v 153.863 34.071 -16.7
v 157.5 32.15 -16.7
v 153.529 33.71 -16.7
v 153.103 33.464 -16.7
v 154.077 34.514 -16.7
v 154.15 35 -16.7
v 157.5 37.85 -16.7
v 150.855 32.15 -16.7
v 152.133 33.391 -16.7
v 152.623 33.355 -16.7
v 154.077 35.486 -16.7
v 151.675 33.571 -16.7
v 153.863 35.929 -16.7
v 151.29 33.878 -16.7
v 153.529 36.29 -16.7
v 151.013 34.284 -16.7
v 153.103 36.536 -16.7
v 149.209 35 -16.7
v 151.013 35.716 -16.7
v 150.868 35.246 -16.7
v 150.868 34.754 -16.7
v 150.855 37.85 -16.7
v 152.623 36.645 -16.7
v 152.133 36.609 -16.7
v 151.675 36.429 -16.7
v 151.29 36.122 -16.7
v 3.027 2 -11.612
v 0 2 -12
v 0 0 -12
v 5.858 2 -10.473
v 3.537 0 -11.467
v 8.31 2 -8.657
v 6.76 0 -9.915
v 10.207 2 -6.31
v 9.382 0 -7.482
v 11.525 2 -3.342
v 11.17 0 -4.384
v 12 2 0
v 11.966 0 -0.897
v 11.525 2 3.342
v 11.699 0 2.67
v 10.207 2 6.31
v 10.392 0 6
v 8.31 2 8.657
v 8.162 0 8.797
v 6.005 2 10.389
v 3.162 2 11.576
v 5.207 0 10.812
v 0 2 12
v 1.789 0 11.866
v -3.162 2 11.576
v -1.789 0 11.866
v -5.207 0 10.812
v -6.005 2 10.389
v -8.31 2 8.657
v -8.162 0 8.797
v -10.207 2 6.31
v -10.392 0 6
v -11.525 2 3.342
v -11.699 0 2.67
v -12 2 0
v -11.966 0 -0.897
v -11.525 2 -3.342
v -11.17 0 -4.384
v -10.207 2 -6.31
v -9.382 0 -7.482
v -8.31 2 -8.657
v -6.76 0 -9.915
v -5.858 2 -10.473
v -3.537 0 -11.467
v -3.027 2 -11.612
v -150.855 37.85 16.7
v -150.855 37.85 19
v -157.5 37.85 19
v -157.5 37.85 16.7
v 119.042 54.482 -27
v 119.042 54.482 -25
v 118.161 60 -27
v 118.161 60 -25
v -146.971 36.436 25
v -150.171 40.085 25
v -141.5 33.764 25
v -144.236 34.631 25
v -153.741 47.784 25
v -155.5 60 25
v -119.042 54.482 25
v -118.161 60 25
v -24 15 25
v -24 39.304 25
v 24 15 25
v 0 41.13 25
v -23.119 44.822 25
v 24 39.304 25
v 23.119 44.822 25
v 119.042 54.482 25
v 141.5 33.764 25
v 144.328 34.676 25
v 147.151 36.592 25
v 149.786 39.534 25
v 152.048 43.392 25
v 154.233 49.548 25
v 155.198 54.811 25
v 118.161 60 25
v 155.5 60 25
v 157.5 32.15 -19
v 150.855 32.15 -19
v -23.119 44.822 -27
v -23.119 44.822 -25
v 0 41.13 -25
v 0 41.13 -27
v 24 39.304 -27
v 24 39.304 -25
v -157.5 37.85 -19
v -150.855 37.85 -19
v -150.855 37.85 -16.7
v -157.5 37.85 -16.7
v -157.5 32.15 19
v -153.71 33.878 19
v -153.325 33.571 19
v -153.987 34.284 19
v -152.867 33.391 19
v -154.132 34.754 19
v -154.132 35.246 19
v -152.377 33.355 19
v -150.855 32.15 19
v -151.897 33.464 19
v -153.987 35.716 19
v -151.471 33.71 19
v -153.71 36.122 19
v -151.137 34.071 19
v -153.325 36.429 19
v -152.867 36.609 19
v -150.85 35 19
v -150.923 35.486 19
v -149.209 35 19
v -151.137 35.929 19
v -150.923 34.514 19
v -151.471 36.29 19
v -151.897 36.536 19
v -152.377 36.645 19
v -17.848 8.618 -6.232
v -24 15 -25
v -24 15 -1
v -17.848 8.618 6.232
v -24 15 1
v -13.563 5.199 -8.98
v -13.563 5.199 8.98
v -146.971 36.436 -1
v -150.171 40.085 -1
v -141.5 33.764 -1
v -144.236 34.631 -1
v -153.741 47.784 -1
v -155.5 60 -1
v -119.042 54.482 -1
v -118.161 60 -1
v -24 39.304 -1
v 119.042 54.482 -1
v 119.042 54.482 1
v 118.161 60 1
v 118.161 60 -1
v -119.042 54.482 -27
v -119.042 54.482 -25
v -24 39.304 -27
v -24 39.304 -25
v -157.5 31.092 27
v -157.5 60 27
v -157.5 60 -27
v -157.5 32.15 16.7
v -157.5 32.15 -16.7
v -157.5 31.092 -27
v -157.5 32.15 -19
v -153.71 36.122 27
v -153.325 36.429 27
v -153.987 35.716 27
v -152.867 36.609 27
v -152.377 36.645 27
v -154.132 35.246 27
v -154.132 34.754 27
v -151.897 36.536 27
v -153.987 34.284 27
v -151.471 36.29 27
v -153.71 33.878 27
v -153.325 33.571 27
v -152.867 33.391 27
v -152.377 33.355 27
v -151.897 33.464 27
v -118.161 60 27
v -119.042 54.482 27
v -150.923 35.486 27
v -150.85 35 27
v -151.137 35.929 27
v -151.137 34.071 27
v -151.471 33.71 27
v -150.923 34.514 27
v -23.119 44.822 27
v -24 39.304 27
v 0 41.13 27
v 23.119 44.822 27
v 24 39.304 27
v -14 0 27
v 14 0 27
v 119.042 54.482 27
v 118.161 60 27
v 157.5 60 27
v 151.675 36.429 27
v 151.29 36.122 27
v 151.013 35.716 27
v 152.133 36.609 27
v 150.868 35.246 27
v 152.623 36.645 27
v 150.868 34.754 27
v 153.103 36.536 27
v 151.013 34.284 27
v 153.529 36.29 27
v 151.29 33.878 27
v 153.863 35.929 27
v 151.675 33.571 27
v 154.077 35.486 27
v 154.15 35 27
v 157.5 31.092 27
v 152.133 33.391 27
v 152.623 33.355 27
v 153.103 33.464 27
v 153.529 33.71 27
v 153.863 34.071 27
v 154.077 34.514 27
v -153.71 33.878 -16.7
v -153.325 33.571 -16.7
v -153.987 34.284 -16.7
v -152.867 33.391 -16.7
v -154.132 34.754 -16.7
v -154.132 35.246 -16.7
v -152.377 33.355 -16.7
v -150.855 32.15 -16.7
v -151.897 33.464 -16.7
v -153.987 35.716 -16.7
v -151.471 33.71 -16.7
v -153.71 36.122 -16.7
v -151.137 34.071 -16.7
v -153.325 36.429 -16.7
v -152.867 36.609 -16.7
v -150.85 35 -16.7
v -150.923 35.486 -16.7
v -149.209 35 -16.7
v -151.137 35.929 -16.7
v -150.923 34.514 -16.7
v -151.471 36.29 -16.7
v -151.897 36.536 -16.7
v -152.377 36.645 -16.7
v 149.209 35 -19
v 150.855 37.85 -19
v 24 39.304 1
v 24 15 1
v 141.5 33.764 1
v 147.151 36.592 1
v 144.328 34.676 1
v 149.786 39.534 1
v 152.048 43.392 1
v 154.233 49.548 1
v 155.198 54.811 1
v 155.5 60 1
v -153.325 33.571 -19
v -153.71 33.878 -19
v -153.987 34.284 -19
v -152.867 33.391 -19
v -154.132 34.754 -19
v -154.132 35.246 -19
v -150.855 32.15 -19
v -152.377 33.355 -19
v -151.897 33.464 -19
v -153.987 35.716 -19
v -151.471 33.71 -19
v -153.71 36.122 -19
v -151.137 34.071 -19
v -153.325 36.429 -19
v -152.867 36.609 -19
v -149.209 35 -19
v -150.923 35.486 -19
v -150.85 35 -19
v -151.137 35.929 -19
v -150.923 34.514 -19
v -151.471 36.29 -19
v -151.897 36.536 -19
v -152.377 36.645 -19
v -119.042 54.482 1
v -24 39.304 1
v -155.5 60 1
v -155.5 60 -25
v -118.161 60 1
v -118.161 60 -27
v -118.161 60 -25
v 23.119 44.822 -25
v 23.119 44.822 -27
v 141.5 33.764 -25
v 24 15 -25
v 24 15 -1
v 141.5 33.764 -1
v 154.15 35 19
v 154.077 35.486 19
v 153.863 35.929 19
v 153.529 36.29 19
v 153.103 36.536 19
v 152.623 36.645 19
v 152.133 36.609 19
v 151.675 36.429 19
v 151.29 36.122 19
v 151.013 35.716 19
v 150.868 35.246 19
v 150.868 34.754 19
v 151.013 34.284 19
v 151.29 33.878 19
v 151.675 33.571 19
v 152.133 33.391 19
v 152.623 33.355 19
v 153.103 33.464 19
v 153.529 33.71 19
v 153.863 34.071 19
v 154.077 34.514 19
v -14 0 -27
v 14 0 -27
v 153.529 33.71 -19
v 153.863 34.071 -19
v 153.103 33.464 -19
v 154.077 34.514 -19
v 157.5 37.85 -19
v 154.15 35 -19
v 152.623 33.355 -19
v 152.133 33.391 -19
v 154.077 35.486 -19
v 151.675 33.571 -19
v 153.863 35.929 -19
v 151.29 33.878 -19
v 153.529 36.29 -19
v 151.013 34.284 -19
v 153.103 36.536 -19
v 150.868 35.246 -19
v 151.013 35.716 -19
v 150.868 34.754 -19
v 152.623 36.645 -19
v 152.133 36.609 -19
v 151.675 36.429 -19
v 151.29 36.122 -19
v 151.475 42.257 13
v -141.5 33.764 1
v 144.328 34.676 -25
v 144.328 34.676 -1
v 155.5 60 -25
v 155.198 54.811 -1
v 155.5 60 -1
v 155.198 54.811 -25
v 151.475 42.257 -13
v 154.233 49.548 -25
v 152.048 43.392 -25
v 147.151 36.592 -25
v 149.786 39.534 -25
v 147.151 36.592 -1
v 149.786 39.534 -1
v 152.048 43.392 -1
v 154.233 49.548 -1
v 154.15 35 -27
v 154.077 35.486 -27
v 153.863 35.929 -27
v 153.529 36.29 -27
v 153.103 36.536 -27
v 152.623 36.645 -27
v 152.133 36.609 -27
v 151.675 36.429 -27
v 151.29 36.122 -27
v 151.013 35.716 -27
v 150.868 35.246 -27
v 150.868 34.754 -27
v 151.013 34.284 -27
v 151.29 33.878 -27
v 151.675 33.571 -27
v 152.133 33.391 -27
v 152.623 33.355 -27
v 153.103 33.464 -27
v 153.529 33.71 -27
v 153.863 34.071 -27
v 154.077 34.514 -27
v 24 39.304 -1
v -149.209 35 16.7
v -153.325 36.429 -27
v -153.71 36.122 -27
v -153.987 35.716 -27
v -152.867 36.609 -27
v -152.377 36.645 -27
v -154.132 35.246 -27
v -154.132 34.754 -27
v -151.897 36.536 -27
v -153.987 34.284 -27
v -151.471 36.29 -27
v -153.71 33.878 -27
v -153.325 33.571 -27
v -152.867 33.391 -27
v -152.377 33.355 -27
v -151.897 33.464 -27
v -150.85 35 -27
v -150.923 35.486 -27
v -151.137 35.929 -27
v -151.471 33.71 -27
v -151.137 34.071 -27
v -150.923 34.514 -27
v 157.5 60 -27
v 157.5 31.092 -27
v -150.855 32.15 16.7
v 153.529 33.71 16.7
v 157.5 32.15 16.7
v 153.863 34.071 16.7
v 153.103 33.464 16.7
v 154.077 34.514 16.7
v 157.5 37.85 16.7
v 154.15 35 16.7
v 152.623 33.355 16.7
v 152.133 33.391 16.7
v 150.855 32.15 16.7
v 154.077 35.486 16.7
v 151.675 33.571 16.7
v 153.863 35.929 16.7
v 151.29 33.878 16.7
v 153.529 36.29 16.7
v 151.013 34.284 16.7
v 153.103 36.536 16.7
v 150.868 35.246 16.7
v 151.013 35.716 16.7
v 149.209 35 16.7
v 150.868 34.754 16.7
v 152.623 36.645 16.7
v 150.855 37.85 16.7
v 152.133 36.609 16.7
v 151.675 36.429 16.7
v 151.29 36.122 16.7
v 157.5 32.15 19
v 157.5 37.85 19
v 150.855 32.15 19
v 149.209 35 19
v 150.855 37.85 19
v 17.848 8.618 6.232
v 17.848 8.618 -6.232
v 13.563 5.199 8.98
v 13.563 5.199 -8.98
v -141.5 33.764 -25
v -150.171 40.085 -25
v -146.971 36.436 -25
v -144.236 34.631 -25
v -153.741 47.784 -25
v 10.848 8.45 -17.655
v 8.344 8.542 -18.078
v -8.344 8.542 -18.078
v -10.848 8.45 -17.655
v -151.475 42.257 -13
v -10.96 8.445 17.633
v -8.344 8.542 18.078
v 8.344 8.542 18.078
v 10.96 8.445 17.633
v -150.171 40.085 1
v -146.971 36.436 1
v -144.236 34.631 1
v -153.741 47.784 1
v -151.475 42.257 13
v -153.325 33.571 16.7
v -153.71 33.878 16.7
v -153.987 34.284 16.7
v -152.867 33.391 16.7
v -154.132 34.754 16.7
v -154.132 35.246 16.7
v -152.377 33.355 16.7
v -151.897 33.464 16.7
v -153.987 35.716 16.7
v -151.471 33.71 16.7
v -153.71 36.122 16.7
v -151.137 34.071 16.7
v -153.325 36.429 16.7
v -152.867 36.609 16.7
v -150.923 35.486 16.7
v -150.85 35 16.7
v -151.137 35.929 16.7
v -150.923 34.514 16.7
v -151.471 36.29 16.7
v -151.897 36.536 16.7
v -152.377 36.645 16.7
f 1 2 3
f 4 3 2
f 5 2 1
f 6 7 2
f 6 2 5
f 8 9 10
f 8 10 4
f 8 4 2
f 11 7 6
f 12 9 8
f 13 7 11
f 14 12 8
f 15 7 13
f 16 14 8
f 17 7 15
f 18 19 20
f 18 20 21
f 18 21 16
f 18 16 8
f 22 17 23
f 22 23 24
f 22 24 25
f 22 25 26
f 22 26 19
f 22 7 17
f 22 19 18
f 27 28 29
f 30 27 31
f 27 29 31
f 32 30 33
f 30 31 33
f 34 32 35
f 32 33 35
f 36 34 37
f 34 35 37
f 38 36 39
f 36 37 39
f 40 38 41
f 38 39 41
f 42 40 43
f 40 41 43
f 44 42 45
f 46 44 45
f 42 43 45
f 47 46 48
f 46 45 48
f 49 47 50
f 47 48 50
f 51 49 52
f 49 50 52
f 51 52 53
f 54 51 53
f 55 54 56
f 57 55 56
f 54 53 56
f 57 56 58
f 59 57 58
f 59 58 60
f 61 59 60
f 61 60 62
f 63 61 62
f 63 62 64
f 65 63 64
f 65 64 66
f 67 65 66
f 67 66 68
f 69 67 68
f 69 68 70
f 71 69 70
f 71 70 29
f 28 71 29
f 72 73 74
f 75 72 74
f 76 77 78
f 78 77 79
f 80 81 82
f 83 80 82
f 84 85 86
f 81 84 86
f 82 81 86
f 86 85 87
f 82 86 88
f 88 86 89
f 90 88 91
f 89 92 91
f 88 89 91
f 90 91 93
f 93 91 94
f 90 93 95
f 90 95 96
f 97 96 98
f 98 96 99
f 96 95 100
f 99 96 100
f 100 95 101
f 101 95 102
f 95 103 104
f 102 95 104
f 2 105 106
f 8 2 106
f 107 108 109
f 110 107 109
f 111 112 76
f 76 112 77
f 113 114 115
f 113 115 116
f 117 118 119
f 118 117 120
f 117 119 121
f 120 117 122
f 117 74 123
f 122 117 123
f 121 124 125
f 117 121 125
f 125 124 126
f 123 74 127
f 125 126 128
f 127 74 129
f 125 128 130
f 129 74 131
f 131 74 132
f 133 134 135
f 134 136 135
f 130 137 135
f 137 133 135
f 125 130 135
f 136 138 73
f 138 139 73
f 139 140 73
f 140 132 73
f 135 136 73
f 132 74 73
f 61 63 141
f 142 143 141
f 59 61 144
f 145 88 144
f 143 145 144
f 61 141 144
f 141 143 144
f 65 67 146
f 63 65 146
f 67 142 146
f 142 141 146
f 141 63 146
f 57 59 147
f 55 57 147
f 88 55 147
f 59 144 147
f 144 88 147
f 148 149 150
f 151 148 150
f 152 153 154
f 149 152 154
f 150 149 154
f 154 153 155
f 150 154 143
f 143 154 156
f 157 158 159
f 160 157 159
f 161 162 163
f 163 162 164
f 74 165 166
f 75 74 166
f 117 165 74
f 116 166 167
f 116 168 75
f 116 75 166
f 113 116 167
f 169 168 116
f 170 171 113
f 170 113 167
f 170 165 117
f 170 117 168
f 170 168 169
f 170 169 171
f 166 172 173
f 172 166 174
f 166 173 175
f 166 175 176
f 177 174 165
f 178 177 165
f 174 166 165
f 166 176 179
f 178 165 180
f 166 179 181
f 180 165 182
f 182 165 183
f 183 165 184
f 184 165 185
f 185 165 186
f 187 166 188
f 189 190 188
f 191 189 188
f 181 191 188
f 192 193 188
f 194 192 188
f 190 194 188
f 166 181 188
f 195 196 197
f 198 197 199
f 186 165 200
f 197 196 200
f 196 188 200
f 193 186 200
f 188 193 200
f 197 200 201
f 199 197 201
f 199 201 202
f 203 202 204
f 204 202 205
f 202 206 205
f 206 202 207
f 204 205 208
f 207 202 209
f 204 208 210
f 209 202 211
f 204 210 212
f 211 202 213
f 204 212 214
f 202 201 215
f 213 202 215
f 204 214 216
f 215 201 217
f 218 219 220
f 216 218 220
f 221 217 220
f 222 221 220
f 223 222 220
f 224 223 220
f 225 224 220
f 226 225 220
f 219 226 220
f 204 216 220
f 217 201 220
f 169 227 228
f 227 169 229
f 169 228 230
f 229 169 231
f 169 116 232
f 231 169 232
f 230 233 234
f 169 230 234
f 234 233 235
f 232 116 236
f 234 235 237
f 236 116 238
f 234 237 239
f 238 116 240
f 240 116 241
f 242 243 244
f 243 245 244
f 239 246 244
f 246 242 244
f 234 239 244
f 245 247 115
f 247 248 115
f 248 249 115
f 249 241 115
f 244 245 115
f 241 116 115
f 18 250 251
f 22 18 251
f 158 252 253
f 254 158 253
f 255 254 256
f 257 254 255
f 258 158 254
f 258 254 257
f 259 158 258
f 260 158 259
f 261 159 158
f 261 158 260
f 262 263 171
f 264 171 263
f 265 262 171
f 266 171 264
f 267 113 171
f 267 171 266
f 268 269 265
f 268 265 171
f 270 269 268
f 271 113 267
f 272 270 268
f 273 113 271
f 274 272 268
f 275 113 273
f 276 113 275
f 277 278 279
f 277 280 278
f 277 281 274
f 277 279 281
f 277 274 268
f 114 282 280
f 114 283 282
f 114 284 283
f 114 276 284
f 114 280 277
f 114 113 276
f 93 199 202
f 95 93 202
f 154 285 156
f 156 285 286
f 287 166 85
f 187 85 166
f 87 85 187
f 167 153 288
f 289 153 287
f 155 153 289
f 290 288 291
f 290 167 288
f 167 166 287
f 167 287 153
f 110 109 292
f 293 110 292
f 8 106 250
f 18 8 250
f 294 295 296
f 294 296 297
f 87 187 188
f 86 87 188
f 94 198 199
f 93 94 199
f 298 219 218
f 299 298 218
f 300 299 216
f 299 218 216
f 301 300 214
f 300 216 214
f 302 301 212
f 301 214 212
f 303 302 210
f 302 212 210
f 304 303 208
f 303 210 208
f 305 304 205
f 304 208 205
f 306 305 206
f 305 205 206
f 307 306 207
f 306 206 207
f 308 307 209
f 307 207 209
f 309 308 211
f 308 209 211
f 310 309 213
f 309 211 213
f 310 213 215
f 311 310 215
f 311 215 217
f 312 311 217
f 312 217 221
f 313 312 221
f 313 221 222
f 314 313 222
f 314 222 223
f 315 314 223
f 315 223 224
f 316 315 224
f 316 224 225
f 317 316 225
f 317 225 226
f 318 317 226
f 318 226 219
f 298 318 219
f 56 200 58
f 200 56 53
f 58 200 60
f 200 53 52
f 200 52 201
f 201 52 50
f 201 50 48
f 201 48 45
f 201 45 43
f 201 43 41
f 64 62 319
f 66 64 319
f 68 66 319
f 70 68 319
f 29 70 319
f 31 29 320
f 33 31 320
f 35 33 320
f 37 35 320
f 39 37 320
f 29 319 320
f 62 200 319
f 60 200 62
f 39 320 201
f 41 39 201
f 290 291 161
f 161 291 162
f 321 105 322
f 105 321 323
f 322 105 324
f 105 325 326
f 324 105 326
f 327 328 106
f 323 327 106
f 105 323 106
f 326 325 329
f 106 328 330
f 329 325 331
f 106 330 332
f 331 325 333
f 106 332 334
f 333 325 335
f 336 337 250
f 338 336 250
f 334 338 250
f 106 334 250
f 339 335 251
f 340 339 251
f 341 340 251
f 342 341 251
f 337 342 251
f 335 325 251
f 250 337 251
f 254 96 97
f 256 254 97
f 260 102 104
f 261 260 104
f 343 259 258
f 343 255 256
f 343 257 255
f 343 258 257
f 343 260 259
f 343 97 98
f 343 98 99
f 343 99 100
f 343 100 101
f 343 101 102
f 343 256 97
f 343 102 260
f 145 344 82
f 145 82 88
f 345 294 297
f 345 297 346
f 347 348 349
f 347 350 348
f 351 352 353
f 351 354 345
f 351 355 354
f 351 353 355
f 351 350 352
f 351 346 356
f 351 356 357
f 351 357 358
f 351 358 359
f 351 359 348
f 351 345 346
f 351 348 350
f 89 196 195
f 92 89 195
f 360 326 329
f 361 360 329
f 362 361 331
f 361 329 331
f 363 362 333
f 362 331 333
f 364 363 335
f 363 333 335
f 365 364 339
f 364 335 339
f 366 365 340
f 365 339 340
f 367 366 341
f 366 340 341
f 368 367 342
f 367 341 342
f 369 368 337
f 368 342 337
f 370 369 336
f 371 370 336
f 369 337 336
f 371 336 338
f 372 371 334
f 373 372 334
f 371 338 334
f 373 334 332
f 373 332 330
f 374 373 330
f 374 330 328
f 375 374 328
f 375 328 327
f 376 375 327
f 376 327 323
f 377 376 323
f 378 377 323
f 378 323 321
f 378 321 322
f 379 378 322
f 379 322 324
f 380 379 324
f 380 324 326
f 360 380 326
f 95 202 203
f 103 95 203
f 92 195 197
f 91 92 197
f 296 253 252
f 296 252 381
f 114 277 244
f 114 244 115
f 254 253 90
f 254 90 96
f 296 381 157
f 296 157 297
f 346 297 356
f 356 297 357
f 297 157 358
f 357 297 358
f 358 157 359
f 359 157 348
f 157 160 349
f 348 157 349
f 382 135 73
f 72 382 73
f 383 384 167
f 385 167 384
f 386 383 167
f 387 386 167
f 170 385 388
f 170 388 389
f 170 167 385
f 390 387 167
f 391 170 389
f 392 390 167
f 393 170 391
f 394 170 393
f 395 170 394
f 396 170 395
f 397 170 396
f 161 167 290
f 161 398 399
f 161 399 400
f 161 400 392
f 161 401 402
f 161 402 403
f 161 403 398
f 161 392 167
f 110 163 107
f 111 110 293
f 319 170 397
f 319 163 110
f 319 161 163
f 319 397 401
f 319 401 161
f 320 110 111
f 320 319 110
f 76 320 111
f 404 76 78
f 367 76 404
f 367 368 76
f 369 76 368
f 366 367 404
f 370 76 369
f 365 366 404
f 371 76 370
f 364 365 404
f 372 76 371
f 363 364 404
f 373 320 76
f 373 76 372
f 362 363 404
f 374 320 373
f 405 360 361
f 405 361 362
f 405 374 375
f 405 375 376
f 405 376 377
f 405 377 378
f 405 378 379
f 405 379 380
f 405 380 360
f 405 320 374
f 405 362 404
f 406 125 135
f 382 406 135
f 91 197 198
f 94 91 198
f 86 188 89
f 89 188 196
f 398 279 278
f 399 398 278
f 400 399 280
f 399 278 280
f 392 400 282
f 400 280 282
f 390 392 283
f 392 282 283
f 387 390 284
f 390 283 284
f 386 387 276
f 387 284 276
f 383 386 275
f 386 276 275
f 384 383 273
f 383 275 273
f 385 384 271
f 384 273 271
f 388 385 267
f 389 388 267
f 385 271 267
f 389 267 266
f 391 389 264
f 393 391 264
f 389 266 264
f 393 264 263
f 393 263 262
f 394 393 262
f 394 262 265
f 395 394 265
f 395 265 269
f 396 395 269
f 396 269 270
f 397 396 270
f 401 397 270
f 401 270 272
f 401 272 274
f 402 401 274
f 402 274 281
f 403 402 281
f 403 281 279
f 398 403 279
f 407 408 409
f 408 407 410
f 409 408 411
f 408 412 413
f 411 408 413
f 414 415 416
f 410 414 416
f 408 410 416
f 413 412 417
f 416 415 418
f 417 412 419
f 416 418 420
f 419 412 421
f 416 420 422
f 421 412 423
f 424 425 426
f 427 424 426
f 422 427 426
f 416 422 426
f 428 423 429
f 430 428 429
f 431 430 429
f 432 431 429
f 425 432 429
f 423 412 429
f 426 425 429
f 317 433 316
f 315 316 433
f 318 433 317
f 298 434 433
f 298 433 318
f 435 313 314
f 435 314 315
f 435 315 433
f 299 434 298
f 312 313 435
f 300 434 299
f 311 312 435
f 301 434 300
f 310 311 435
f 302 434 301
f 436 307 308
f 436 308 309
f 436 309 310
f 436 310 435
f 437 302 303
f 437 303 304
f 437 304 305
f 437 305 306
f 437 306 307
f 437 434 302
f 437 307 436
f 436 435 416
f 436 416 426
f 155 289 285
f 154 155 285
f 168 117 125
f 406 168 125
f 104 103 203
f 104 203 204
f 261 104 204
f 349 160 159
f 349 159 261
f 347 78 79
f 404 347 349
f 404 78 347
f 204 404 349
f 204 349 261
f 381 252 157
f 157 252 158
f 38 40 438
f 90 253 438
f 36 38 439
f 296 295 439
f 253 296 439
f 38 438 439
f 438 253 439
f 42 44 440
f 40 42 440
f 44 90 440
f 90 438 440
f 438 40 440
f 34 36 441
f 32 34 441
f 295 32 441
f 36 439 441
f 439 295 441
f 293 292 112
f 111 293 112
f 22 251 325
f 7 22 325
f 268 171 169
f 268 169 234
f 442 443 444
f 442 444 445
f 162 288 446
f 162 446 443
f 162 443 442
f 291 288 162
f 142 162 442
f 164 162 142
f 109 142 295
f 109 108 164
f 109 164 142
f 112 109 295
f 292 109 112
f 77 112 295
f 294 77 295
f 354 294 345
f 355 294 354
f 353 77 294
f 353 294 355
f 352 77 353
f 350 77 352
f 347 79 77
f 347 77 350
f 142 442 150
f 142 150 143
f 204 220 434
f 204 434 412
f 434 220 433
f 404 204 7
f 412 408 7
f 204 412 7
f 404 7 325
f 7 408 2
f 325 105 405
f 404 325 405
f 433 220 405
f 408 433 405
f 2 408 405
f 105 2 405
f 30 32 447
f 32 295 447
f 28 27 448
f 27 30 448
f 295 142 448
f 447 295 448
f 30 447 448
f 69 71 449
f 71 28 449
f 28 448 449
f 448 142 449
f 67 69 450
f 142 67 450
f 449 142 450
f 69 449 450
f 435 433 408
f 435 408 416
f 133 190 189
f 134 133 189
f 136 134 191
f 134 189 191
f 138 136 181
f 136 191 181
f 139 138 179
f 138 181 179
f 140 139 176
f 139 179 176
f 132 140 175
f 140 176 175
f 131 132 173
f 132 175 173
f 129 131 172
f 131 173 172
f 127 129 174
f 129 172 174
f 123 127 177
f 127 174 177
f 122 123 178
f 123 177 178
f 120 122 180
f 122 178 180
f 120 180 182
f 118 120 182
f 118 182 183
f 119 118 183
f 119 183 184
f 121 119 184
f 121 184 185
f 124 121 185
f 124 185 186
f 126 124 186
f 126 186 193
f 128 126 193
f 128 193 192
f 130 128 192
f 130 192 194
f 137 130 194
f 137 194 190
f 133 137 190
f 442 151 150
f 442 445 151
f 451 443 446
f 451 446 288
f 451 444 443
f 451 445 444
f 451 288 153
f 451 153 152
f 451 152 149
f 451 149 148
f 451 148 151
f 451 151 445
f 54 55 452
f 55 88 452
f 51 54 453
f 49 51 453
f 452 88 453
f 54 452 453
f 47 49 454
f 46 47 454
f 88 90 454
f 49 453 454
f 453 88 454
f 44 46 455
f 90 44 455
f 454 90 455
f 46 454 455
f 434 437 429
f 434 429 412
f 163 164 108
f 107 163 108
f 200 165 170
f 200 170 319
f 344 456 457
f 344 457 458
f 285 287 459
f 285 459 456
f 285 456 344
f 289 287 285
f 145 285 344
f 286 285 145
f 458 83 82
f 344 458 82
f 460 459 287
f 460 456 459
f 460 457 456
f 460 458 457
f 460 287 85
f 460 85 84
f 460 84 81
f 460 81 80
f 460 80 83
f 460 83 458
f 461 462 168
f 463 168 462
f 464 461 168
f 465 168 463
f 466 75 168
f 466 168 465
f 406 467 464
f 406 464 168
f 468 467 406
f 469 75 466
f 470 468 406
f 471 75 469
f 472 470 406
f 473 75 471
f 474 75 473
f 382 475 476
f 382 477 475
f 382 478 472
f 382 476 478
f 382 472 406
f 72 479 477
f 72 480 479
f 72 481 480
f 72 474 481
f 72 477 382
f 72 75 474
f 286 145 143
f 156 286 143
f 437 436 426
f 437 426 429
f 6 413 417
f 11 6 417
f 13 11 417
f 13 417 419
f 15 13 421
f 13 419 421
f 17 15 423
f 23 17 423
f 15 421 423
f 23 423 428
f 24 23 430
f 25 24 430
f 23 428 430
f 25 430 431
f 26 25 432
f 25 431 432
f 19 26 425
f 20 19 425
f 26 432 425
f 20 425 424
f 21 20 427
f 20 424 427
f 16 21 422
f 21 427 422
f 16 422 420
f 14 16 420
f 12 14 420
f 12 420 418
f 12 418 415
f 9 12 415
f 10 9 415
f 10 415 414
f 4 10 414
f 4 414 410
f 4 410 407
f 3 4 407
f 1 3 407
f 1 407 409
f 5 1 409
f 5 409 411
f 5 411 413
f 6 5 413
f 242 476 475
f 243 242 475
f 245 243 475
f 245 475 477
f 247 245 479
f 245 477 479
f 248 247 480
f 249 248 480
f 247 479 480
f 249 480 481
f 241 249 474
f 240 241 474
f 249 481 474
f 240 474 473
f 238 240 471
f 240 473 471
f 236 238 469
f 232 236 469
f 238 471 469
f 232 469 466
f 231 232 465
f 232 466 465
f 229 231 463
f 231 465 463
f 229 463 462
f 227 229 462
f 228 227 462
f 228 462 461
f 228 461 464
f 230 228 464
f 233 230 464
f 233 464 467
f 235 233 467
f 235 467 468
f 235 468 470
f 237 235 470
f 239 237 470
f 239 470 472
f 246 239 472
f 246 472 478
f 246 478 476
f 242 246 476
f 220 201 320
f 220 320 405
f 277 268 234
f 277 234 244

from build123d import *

# Parameters (mm, degrees)
SKETCH1_W               = 315
SKETCH1_H               = 54
BOSS_EXTRUDE2_DEPTH     = 60
CUT_EXTRUDE2_DEPTH      = 25
CUT_EXTRUDE2_DEPTH_BACK = 25
BOSS_EXTRUDE3_DEPTH     = 1
SKETCH9_W               = 48
SKETCH9_H               = 50
CUT_EXTRUDE5_DEPTH      = 167.012800738
SKETCH10_R              = 12
CUT_EXTRUDE6_DEPTH      = 2
SKETCH11_R              = 1.65
CUT_EXTRUDE7_DEPTH      = 177.98093121
CUT_EXTRUDE8_DEPTH      = 2.3
CUT_EXTRUDE9_DEPTH      = 2.3


with BuildPart() as part:
    # Sketch1 → Boss-Extrude2 (new body)
    with BuildSketch(Plane(origin=(0, 0, 0), x_dir=(1, 0, 0), z_dir=(0, 1, 0))):
        Rectangle(SKETCH1_W, SKETCH1_H)
    extrude(amount=BOSS_EXTRUDE2_DEPTH)

    # Sketch7 → Cut-Extrude2 (cut, two sides: drawn at the far end of the back side and taken through both)
    with BuildSketch(Plane.XY.offset(-CUT_EXTRUDE2_DEPTH_BACK)):
        with BuildLine():
            Line((-141.5, 33.764258555), (-24, 15))
            Line((-24, 15), (24, 15))
            Line((24, 15), (141.5, 33.764258555))
            add(Edge.make_bspline(
                [(141.5, 33.764258555), (155.5, 36), (155.5, 60)],
                knots=[3.234883811, 3.234883811, 3.234883811, 4.71238898, 4.71238898, 4.71238898], degree=2, weights=[1, 0.739309101, 1]))
            Line((155.5, 60), (-155.5, 60))
            add(Edge.make_bspline(
                [(-155.5, 60), (-155.5, 36), (-141.5, 33.764258555)],
                knots=[4.71238898, 4.71238898, 4.71238898, 6.18989415, 6.18989415, 6.18989415], degree=2, weights=[1, 0.739309101, 1]))
        make_face()
    extrude(amount=CUT_EXTRUDE2_DEPTH + CUT_EXTRUDE2_DEPTH_BACK, mode=Mode.SUBTRACT)

    # Sketch7<2> → Boss-Extrude3 (add, symmetric)
    with BuildSketch(Plane.XY):
        with BuildLine():
            Line((-141.5, 33.764258555), (-24, 15))
            Line((-24, 15), (24, 15))
            Line((24, 15), (141.5, 33.764258555))
            add(Edge.make_bspline(
                [(141.5, 33.764258555), (155.5, 36), (155.5, 60)],
                knots=[3.234883811, 3.234883811, 3.234883811, 4.71238898, 4.71238898, 4.71238898], degree=2, weights=[1, 0.739309101, 1]))
            Line((155.5, 60), (-155.5, 60))
            add(Edge.make_bspline(
                [(-155.5, 60), (-155.5, 36), (-141.5, 33.764258555)],
                knots=[4.71238898, 4.71238898, 4.71238898, 6.18989415, 6.18989415, 6.18989415], degree=2, weights=[1, 0.739309101, 1]))
        make_face()
    extrude(amount=BOSS_EXTRUDE3_DEPTH, both=True)

    # Sketch9 → Cut-Extrude5 (cut, through all)
    with BuildSketch(Plane(origin=(0, 15, 0), x_dir=(1, 0, 0), z_dir=(0, 1, 0))):
        Rectangle(SKETCH9_W, SKETCH9_H)
    extrude(amount=CUT_EXTRUDE5_DEPTH, mode=Mode.SUBTRACT)

    # Sketch10 → Cut-Extrude6 (cut)
    with BuildSketch(Plane.XZ):
        with Locations(Location((0, 0, 0), (0, 0, 270))):
            Circle(SKETCH10_R)
    extrude(amount=-CUT_EXTRUDE6_DEPTH, mode=Mode.SUBTRACT)

    # Sketch4 for Cut-Loft3 → Cut-Loft3 section 0
    with BuildSketch(Plane.XZ.offset(-2)):
        with BuildLine():
            # circular arc as an exact rational Bezier (weights 1, cos(half-angle), 1)
            Bezier((-8.310381938, 8.656647852), (0, 16.634614514), (8.310381938, 8.656647852), weights=[1, 0.721387321, 1])
            Bezier((8.310381938, 8.656647852), (17.327723452, 0), (8.310381938, -8.656647852), weights=[1, 0.692531828, 1])
            Bezier((8.310381938, -8.656647852), (0, -16.634614514), (-8.310381938, -8.656647852), weights=[1, 0.721387321, 1])
            Bezier((-8.310381938, -8.656647852), (-17.327723452, 0), (-8.310381938, 8.656647852), weights=[1, 0.692531828, 1])
        make_face()
    # Sketch9<2> → Cut-Loft3 section 1
    with BuildSketch(Plane(origin=(0, 15, 0), x_dir=(1, 0, 0), z_dir=(0, 1, 0))):
        with BuildLine():
            Line((-24, -25), (24, -25))
            Line((24, -25), (24, 25))
            Line((24, 25), (-24, 25))
            Line((-24, 25), (-24, -25))
        make_face()
    loft(mode=Mode.SUBTRACT)

    # Sketch11 → Cut-Extrude7 (cut, through all)
    with BuildSketch(Plane.XY.offset(27)):
        with Locations((-152.5, 35)):
            Circle(SKETCH11_R)
        with Locations((152.5, 35)):
            Circle(SKETCH11_R)
        Polygon((-157.5, 31.091711648), (-14, 0), (-157.5, 0), align=None)
        Polygon((157.5, 31.091711648), (157.5, 0), (14, 0), align=None)
        Polygon((-118.160810021, 60), (-119.042024296, 54.481920135), (-24, 39.304106369), (-23.118785725, 44.822186234), (0, 41.130212848), (23.118785725, 44.822186234), (24, 39.304106369), (119.042024296, 54.481920135), (118.160810021, 60), align=None)
    extrude(amount=-CUT_EXTRUDE7_DEPTH, mode=Mode.SUBTRACT)

    # Sketch12 → Cut-Extrude8 (cut)
    with BuildSketch(Plane.XY.offset(19)):
        Polygon((-150.854551733, 37.85), (-157.5, 37.85), (-157.5, 32.15), (-150.854551733, 32.15), (-149.209103466, 35), align=None)
        Polygon((157.5, 37.85), (157.5, 32.15), (150.854551733, 32.15), (149.209103466, 35), (150.854551733, 37.85), align=None)
    extrude(amount=-CUT_EXTRUDE8_DEPTH, mode=Mode.SUBTRACT)

    # Sketch13 → Cut-Extrude9 (cut)
    with BuildSketch(Plane(origin=(0, 0, -19), x_dir=(-1, 0, 0), z_dir=(0, 0, -1))):
        Polygon((-150.854551733, 37.85), (-157.5, 37.85), (-157.5, 32.15), (-150.854551733, 32.15), (-149.209103466, 35), align=None)
        Polygon((157.5, 37.85), (157.5, 32.15), (150.854551733, 32.15), (149.209103466, 35), (150.854551733, 37.85), align=None)
    extrude(amount=-CUT_EXTRUDE9_DEPTH, mode=Mode.SUBTRACT)


solid = part.part
